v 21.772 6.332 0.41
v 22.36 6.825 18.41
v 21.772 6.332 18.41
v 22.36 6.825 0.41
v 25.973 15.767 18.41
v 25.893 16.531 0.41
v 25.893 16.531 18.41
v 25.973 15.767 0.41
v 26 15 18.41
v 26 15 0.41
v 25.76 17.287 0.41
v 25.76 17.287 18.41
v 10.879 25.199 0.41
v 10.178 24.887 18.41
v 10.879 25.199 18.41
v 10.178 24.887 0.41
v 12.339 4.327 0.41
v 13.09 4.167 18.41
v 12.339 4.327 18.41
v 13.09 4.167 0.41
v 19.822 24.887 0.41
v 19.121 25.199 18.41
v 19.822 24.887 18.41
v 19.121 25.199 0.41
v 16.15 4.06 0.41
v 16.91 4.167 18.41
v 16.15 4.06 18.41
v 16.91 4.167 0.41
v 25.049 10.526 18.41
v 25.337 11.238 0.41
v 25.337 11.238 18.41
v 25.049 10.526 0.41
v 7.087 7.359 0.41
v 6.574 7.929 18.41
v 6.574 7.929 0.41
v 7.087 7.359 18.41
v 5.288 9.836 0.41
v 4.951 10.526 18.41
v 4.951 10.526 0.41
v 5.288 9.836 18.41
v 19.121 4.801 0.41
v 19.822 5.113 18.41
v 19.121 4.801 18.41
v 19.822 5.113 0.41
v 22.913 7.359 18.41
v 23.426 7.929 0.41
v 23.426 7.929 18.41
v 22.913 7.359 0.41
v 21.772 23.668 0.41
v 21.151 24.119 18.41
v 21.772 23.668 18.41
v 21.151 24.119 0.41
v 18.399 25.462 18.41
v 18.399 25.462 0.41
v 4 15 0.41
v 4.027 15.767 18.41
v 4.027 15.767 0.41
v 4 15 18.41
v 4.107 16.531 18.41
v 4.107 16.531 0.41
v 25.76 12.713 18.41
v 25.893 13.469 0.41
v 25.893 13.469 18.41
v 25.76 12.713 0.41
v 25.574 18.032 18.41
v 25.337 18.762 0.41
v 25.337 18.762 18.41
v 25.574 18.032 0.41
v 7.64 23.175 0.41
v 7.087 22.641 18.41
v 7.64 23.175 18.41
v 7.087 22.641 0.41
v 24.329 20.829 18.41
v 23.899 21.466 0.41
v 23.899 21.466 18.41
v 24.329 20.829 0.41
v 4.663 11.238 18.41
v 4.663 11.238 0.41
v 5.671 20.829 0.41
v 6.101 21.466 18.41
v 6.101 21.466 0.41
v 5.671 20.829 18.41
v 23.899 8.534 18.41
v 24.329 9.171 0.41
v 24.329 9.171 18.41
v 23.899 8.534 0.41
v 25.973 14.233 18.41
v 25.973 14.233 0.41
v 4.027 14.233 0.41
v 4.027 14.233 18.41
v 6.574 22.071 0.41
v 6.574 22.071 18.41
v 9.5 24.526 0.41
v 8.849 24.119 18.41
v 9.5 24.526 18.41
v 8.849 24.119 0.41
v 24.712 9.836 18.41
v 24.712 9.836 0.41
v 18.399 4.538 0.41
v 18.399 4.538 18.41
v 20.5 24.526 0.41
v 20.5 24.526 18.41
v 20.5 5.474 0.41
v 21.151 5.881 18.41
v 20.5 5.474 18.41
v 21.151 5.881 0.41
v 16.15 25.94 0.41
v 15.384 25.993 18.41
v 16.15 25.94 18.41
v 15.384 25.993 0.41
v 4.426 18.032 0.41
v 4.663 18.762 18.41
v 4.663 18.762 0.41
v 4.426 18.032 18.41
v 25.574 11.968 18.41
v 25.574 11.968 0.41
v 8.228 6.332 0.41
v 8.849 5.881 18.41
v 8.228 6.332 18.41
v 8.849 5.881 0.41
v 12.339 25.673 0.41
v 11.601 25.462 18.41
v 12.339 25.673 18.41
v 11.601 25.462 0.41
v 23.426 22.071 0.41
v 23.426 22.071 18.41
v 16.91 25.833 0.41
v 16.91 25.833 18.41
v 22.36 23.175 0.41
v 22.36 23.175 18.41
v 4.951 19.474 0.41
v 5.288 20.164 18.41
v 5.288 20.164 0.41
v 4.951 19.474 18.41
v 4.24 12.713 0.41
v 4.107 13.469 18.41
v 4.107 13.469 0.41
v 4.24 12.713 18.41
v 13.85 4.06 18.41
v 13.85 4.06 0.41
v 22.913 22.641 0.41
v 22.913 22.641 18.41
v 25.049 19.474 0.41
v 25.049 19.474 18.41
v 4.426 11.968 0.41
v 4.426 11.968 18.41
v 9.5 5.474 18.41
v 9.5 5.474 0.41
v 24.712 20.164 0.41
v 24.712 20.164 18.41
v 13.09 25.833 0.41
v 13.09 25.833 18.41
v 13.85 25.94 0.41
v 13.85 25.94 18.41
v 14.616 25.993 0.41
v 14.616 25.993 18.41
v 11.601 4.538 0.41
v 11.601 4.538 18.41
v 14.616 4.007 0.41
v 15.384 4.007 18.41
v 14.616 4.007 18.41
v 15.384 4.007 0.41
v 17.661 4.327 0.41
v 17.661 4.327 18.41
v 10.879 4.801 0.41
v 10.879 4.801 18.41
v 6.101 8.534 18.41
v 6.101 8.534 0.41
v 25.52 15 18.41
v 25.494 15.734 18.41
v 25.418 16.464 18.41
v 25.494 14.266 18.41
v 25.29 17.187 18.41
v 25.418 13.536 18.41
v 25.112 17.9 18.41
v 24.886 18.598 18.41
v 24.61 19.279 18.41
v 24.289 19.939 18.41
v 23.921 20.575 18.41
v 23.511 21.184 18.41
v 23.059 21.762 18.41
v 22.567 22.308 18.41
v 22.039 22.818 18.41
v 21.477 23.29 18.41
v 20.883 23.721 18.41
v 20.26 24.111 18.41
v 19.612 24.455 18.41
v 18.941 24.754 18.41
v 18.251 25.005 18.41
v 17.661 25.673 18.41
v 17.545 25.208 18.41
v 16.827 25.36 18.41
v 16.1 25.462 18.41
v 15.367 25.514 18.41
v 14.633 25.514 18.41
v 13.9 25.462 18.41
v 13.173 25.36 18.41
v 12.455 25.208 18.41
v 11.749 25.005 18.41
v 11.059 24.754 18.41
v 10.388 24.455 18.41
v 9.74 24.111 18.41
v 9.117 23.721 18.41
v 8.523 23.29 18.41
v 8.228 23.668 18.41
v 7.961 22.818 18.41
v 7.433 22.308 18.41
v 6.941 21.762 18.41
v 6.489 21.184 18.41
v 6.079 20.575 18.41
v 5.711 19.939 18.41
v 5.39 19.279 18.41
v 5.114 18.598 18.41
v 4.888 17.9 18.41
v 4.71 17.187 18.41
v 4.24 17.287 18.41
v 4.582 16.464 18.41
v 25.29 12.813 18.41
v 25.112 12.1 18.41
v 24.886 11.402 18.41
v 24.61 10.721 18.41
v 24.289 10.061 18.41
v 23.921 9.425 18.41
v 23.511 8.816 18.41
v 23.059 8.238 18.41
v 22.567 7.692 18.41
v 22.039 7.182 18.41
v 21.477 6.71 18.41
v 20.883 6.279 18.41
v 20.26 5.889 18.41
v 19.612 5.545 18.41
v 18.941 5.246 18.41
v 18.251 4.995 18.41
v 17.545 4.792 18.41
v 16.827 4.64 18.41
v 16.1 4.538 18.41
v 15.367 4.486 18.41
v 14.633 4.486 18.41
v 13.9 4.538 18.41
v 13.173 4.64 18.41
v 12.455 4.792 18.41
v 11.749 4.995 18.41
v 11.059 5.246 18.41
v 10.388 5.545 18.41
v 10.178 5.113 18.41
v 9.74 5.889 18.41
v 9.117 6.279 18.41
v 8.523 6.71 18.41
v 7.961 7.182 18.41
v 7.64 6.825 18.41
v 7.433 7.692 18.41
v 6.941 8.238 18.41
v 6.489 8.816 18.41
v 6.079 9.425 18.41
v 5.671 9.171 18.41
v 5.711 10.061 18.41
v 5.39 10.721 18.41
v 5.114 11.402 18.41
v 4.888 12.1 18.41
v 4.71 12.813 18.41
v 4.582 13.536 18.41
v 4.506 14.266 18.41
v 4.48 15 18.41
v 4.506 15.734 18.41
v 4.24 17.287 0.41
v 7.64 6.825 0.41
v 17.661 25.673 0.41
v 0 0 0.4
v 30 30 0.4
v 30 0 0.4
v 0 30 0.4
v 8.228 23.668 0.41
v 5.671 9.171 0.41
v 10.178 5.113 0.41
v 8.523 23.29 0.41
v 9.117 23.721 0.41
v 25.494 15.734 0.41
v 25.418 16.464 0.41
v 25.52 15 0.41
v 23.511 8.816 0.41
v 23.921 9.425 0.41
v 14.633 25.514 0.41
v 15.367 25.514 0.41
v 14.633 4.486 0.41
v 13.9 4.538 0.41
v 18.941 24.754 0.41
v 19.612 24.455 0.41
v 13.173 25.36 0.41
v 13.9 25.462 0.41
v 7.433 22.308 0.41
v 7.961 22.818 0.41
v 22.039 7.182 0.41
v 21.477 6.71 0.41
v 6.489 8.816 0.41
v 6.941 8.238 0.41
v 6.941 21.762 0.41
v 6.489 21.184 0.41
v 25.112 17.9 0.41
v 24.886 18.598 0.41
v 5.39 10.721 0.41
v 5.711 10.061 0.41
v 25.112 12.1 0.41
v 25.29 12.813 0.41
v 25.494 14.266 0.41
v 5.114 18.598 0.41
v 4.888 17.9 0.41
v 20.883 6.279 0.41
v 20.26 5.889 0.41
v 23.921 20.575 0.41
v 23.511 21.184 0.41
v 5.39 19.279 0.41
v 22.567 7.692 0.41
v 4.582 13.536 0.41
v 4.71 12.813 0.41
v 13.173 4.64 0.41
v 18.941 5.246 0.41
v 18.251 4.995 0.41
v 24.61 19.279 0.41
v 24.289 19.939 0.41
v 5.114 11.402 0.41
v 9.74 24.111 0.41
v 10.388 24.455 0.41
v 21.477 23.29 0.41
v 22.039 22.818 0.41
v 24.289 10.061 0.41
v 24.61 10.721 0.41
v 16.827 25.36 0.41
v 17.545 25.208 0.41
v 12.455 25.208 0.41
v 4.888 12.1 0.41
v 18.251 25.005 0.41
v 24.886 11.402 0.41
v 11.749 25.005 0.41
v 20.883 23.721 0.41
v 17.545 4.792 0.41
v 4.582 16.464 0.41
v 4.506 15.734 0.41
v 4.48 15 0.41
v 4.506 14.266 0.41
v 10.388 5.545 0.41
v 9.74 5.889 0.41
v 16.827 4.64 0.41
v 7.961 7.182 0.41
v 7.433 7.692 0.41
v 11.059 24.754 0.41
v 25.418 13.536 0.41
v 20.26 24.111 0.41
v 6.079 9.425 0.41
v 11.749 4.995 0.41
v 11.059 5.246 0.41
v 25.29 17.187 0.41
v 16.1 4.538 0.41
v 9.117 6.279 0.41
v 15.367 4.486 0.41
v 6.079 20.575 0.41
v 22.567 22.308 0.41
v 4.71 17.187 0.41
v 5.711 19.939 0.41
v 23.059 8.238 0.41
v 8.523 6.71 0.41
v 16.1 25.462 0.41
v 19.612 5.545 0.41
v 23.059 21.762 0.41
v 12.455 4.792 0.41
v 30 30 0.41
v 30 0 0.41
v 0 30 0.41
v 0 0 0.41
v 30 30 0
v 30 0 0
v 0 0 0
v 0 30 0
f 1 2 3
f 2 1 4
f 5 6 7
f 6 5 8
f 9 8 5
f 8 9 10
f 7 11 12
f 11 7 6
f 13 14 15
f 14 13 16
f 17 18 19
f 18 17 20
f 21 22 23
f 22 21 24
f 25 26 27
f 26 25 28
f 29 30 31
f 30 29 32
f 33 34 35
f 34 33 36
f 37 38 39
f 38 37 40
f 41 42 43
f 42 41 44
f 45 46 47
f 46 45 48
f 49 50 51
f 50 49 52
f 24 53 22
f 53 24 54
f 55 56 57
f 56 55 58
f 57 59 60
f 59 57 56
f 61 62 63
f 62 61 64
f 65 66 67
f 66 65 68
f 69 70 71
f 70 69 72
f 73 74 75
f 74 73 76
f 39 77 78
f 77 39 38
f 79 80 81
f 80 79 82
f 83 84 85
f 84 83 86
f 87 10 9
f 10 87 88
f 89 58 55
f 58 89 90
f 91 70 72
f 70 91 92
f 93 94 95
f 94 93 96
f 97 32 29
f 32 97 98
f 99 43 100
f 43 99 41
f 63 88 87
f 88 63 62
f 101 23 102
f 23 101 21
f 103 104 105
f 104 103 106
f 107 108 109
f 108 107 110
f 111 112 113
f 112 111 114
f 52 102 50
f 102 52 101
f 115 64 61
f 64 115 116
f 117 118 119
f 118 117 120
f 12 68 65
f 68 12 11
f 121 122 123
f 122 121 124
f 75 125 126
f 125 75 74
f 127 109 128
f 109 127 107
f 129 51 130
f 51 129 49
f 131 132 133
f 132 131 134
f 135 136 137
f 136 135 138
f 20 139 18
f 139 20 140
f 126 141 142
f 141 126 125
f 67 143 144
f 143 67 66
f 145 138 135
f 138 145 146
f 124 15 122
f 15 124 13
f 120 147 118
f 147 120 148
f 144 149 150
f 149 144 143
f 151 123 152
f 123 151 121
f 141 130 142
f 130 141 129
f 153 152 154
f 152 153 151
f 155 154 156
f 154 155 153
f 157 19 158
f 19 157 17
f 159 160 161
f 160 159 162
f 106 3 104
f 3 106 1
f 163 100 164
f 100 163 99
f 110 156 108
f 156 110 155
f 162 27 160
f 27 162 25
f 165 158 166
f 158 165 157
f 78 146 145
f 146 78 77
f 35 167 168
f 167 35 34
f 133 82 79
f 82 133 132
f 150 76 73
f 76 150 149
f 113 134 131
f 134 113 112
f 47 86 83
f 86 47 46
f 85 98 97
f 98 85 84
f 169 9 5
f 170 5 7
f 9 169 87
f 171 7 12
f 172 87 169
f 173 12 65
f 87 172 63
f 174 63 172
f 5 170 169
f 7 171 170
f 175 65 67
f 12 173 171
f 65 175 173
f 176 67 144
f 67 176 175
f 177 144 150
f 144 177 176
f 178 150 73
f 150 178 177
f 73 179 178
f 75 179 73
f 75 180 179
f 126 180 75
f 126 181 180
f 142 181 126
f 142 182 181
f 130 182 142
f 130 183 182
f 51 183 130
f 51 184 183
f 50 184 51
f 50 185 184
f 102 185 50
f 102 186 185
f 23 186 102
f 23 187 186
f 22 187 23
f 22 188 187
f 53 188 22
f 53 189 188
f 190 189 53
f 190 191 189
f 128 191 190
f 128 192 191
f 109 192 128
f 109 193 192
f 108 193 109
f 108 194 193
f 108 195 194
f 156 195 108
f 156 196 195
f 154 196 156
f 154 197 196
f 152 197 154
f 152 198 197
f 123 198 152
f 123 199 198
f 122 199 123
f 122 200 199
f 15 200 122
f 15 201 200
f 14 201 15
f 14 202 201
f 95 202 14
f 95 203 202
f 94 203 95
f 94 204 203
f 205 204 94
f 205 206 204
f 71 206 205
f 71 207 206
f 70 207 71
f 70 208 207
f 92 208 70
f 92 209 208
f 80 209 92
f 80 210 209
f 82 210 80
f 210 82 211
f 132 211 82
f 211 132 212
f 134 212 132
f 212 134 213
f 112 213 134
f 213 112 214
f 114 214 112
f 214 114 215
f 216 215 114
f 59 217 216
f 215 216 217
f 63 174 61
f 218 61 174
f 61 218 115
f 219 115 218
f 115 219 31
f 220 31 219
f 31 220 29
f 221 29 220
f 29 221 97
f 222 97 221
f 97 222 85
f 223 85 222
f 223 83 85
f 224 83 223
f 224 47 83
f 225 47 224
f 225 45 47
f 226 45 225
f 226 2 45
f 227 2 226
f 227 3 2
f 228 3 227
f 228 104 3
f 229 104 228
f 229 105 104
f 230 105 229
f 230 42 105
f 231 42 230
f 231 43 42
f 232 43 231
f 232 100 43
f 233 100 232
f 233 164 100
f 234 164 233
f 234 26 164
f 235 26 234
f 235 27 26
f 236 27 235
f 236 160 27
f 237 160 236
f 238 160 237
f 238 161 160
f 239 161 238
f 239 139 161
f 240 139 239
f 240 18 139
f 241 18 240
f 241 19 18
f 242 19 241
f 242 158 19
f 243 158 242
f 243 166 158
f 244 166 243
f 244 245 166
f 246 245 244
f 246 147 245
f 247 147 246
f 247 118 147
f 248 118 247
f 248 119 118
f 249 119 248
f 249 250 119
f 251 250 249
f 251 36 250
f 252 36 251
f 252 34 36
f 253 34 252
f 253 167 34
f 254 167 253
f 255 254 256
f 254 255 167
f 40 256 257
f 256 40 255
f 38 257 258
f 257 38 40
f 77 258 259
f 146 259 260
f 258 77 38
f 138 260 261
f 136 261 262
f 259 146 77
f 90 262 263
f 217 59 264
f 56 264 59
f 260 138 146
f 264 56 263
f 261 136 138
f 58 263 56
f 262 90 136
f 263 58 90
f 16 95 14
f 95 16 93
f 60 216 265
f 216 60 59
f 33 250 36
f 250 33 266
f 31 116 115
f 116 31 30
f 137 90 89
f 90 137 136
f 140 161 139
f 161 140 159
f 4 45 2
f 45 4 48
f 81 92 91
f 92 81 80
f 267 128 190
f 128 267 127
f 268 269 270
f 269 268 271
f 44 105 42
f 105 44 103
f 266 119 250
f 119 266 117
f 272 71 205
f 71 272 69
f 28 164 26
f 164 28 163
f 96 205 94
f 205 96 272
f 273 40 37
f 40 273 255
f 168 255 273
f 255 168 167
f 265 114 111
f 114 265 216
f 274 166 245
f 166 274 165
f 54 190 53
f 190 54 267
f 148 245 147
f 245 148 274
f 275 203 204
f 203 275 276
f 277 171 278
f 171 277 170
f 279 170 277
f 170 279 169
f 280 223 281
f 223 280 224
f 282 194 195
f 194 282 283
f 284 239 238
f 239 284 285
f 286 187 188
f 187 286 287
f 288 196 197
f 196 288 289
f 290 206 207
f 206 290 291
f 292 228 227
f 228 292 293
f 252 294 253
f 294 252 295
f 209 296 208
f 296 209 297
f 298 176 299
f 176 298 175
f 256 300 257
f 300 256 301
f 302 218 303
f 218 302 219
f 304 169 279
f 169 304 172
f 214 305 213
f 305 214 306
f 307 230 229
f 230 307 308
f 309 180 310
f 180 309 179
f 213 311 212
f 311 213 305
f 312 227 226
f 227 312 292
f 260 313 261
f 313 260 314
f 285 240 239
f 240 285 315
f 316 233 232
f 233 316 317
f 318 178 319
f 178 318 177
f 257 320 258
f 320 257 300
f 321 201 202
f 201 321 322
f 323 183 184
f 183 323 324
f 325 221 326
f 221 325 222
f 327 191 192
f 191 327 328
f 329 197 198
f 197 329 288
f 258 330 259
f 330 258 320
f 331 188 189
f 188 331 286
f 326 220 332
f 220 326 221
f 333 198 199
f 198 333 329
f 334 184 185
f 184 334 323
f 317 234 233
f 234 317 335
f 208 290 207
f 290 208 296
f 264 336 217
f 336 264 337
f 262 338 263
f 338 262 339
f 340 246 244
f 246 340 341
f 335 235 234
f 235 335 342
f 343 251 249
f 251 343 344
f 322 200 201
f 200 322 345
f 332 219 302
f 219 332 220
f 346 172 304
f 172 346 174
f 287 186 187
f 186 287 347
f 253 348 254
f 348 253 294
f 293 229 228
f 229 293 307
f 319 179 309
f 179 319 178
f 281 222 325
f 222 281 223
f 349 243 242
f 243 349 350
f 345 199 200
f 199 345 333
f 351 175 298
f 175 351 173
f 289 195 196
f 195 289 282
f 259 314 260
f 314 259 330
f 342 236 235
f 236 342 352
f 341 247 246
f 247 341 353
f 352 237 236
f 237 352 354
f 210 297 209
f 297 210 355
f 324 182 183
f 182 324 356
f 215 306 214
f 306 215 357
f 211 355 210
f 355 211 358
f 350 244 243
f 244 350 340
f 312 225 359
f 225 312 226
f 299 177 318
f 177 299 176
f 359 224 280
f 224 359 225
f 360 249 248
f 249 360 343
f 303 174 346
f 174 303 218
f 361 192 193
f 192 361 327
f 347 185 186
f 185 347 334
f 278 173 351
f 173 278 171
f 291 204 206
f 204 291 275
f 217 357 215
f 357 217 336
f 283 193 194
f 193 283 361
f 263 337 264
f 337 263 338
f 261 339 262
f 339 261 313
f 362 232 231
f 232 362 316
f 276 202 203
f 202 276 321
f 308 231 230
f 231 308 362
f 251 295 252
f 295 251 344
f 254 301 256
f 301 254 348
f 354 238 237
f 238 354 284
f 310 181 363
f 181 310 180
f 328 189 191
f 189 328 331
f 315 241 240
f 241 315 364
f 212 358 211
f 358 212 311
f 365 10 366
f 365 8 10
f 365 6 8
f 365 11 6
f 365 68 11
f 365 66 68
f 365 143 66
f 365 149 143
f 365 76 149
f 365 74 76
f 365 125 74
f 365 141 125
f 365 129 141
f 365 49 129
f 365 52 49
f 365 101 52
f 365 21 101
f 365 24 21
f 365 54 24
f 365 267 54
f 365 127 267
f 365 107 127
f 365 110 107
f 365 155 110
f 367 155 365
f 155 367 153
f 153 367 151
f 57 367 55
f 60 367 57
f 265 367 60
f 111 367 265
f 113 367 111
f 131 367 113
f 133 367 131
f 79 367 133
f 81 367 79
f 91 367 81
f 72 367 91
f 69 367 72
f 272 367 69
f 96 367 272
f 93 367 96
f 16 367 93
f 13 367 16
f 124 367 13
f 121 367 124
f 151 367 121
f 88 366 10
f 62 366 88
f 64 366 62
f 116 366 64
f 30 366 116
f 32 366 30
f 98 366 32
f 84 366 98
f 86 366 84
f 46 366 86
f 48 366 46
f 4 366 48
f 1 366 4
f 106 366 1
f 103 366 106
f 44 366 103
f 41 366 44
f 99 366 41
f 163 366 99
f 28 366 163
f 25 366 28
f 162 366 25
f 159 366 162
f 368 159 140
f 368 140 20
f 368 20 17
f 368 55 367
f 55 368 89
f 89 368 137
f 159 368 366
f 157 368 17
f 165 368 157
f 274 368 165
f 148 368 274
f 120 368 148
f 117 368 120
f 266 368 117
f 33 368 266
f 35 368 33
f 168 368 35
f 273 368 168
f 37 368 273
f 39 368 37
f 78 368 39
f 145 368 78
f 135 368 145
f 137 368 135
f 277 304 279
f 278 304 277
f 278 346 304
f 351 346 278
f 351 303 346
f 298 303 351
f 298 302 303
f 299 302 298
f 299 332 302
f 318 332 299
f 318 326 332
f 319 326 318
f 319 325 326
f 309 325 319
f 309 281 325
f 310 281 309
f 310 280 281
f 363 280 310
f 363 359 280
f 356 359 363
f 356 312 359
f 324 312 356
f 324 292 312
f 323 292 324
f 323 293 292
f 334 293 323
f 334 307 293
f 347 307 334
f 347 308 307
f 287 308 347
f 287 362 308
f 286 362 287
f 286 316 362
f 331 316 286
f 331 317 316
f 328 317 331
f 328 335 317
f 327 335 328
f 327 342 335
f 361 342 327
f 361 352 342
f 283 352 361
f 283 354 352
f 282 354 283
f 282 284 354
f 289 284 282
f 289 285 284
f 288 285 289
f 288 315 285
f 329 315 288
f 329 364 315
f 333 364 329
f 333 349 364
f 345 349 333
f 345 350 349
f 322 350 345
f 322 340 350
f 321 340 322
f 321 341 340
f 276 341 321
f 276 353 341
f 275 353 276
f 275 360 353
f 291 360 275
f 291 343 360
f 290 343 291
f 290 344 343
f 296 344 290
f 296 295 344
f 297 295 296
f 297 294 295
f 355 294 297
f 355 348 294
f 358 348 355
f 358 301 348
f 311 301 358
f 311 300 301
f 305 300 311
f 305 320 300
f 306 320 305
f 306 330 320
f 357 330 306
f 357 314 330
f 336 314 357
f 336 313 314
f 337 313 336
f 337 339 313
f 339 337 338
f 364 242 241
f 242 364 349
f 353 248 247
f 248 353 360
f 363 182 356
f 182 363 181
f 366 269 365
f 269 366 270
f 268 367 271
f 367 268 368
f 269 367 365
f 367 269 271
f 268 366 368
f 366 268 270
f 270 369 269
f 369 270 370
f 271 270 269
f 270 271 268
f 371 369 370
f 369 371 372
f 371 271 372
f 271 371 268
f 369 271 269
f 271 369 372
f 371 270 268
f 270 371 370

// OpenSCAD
// file: ../../Base/PlacementOptions.scad
// Fischertechnik Box Foundation
// Placement Options

// Alignment
NoAlign = 0;
AlignLeft = 1;
AlignBottom = 2;
AlignCenter = 3;
AlignRight = 4;
AlignTop = 5;

// Element rotation degree steps
rotations = [0, -90, -180, -270];

// Rotation
NoRotation = 0;
Rotate0 = 0;
Rotate90 = 1;
Rotate180 = 2;
Rotate270 = 3;

// Docking (seen from above)
NoDock = -1;
DockLeft = 0;
DockTop = 1;
DockRight = 2;
DockCorner = 2;
DockBottom = 3;

// Web corners
LowerLeft = 0;
UpperLeft = 1;
UpperRight = 2;
LowerRight = 3;

// Web position relative to corner
LeftOfCorner = 0;
RightOfCorner = 1;
// file: ../../Base/Boxes.scad
// Fischertechnik Box Foundation
// Pre-designed Boxes

use <Constants.scad>

include <PlacementOptions.scad>

box190Width = 190;
box190Depth = 130;
box130Width = 130;
box130Depth = 95;
boxUsageHeight = 33.9;
boxWallThickness = 2.4;
boxBaseThickness = 1.0;
boxWebWidth = 3.0;

// getBoxWallThickness()
// Gets the wall thickness of a Fischertechnik Box

function getBoxWallThickness() = boxWallThickness;

// Gets the usable height of a fischertechnik box
function getBoxUsageHeight() = boxUsageHeight;

// Gets the thickness of the Fischertechnik box base.
function getBoxBaseThickness() = boxBaseThickness;

// Gets the width of a box web
function getBoxWebWidth() = boxWebWidth;

// Gets the usable inner space of a Box 190 as an x/y-list
function getBox190Space() = [
    box190Width - 2*getBoxWallThickness(), 
    box190Depth - 2*getBoxWallThickness() ];

// Imports the Fischertechnik empty box 130x190 mm and places it at position 0,0
// 190x130 are the outer sizes, the inner space is slightly smaller. Use getBox190Space() to get the inner sizes.
// This module needs the STL file "Fischertechnik Box 130x190.stl" in the library path.
// The box is positioned that the usable inner space is at the 0,0,0 position. The

module Box190() {
    translate([-getBoxWallThickness(),-getBoxWallThickness(),-getBoxBaseThickness()])
        import("Fischertechnik Box 130x190.stl", convexity=3);
}

// Gets the usable inner space of a Box 130 as an x/y-list
function getBox130Space() = [
    box130Width - 2*getBoxWallThickness(), 
    box130Depth - 2*getBoxWallThickness() ];

// Imports the Fischertechnik empty box 95x130 mm and places it at position 0,0
// 190x130 are the outer sizes, the inner space is slightly smaller. Use getBox190Space() to get the inner sizes.
// This module needs the STL file "Fischertechnik Box 95x130.stl" in the library path.
// The box is positioned that the usable inner space is at the 0,0,0 position. The

module Box130() {
    translate([-getBoxWallThickness(),-getBoxWallThickness(),-getBoxBaseThickness()])
        import("Fischertechnik Box 95x130.stl", convexity=3);
}

// Creates a web at the specified box walls
// corner 0 = LowerLeft, 1 = UpperLeft, 2 = UpperRight, 3 = LowerRight
// side 0 = LeftOfCorner, 1 = RightOfCorner
// distance = Distance in mm from the corner
// box = inner width and depth of the box (default: Box 190)
// webWidth = length of the web (default is 3 mms)
// webThickness = thickness of the web (default is 1 mm)

module BoxWeb(corner, side, distance, box=getBox190Space(), webWidth=getBoxWebWidth(), webThickness=1.0) {
    sink = getBoxWallThickness()/2;

    width = (corner % 2 == 0) ? 
            (side == LeftOfCorner ? webWidth : webThickness) :
            (side == LeftOfCorner ? webThickness : webWidth);

    depth = (corner % 2 == 0) ? 
            (side == RightOfCorner ? webWidth : webThickness) :
            (side == RightOfCorner ? webThickness : webWidth);
    
    xDiff = corner == LowerLeft ? 
                (side == LeftOfCorner ? -sink : distance) :
            (corner == UpperLeft ?                
                (side == LeftOfCorner ? distance : -sink) :
            (corner == UpperRight ?
                (side == LeftOfCorner ? box.x-webWidth+sink : box.x-distance-webThickness) :
                (side == LeftOfCorner ? box.x-distance-webThickness: box.x-webWidth+sink)));

    yDiff = corner == LowerLeft ? 
                (side == RightOfCorner ? -sink : distance) :
            (corner == UpperLeft ?
                (side == RightOfCorner ? box.y-distance : box.y-webWidth+sink) :
            (corner == UpperRight ?
                (side == RightOfCorner ? box.y-webWidth+sink : box.y-distance) :
                (side == RightOfCorner ? distance : -sink)));
    
    translate([xDiff, yDiff, -getExcess()])
        cube([width, depth, boxUsageHeight + 2*getExcess()]);
}
// file: ../../Base/Rotation.scad
// Fischertechnik Box Foundation
// Geometry Helpers Rotation

include <PlacementOptions.scad>

// getRotatedSpace(space, rotation=NoRotation)
// Rotates the space dependent on the specified rotation

function getRotatedSpace(space, rotation=NoRotation) = [
    (rotation == Rotate90 || rotation == Rotate270) ? space.y : space.x,
    (rotation == Rotate90 || rotation == Rotate270) ? space.x : space.y
];

// Rotates the given space around the fixed left lower corner
// space = the space the children needs as width/depth list [width,depth]
// rotation = 0 Rotate0 degrees, 1 Rotate90 degrees, 2 Rotate180 degrees, 3 Rotate270 degrees (equivalent to -90)

module RotateFix(space, rotation=Rotate0) {
    dy = (rotation == Rotate0 || rotation == Rotate270) ? 0 :
        (rotation == Rotate90) ? space.x :
        space.y;
    dx = (rotation < Rotate180) ? 0 :
        (rotation == Rotate180) ? space.x :
        space.y;
    
    translate([dx, dy, 0])
        rotate([0, 0, rotations[rotation]])
            children();
}
// file: ../../Base/Alignment.scad
// Fischertechnik Box Foundation
// Geometry Helpers Alignment

include <PlacementOptions.scad>

// getAlignedX(elementWidth, spaceWidth, align=AlignRight, offset=0)
// Gets the aligned X offset of an element with the given
// width in the given space.
// elementWidth = The width of the element to positon
// spaceWidth = The space where the element should be aligned
// align = 0 AlignLeft, 1 AlignCenter, 2 AlignRight
// offset = an optional offset from the aligned position. When
// aligned left or centered, then positive values are in X direction.
// When aligned right then positive values are in negative X direction.

function getAlignedX(elementWidth, spaceWidth, align=AlignRight, offset=0) =
    (align == AlignLeft) ?
        offset :
        ((align == AlignCenter) ?
        (spaceWidth - elementWidth)/2 + offset :
        spaceWidth - offset - elementWidth);

// getAlignedY(elementDepth, spaceDepth, align=AlignTop, offset=0)
// Gets the aligned Y offset of an element with the given
// depth in the given space.
// elementDepth = The depth of the element to positon
// spaceDepth = The space where the element should be aligned
// align = 0 AlignBottom, 1 AlignCenter, 2 AlignTop
// offset = an optional offset from the aligned position. When
// aligned bottom or centered, then positive values are in Y direction.
// When aligned top then positive values are in negative Y direction.

function getAlignedY(elementDepth, spaceDepth, align=AlignTop, offset=0) =
    (align == AlignBottom) ?
        offset :
        ((align == AlignCenter) ?
        (spaceDepth - elementDepth)/2 + offset :
        spaceDepth - offset - elementDepth);
// file: ../../Base/Placement.scad
// Fischertechnik Box Foundation
// Geometry Helpers Placement

use <Constants.scad>
use <Alignment.scad>
use <Rotation.scad>
use <Boxes.scad>

include <PlacementOptions.scad>

// Place(x=0, y=0, elementSpace=[0,0], alignX=AlignLeft, alignY=AlignBottom, rotation=Rotate0, boxSpace=getBox190Space())
// Places the child at the specified position
// y = Y-Position. This is a relative position when an X aligment is specified.
// x = X-Position. This is a relative position when an Y aligment is specified.
// elementSpace = space of the element to be placed [x,y]
// alignX = -1=NoAlign, 0 AlignLeft, 1 AlignCenter, 3 AlignRight (elementSpace and boxSpace required!)
// alignY = -1=NoAlign, 2 AlignBottom, 1 AlignCenter, 4 AlignTop (elementSpace and boxSpace required!)
// rotation = 0 Rotate0 0 degrees, 1 Rotate90 90 degrees, 
// 2 Rotate180 180 degrees, 3 Rotate270 270 degrees (equivalent to -90)
// boxSpace = Inner space of the box where the placement occurs [x,y] - default is Box 190x130 inner space

module Place(x=0, y=0, elementSpace=[0,0], 
  alignX=AlignLeft, alignY=AlignBottom, 
  rotation=NoRotation, boxSpace=getBox190Space()) {

    module Position(x, y, space, rotation=Rotate0) {
        translate([x, y, 0])
            RotateFix(space, rotation)
                children();
    }

    space = getRotatedSpace(elementSpace, rotation);
    alignedX = getAlignedX(space.x, boxSpace.x, alignX, x);
    alignedY = getAlignedY(space.y, boxSpace.y, alignY, y);
    Position(alignedX, alignedY, elementSpace, rotation)
        children();
}

// Center(space=getBox130Space(), elementSpace=[0,0])
// space = Space where the children is centered. For cylinder use centered=true and no elementSpace.
// elementSpace = space of the element to be centered [x,y]

module Center(space=getBox190Space(), elementSpace=[0,0]) {
    translate([(space.x - elementSpace.x) / 2, (space.y - elementSpace.y) / 2])
        children(0);
}

// CenterHorizontal(width=0, y=0, offset=0, space=getBox130Space())
// space = Space where the children is centered. For cylinder use centered=true and no elementSpace.
// elementSpace = space of the element to be centered [x,y]

module CenterHorizontal(width=0, y=0, offset=0, space=getBox190Space()) {
    translate([(space.x - width) / 2 + offset, y])
        children(0);
}

// CenterVertical(depth=0, x=0, offset=0, space=getBox130Space())
// space = Space where the children is centered. For cylinder use centered=true and no elementSpace.
// elementSpace = space of the element to be centered [x,y]

module CenterVertical(depth=0, x=0, offset=0, space=getBox190Space()) {
    translate([x, (space.y - depth) / 2 + offset])
        children(0);
}
// file: ../../Elements/AxisClip10.scad
// Fischertechnik Box Library
// Axis for clip 10
// 31023

use <../ModelBase/Simple.scad>

width = 12;
depth = 12;
height = 23;

// getAxisClip10Space()
// Gets the space of a frame for a clip 10 with spring ring (mot2)

function getAxisClip10Space() = [width, depth, height];

// AxisClip10()
// Axis for clip 10 with spring ring (mot2)

module AxisClip10() {
    LeveledAxisWithSpace(height, height-10, getAxisClip10Space());
}

// Tests
color("lightgray")
AxisClip10();
// file: ../../Base/Constants.scad
// Fischertechnik Box Foundation
// Constants

// Constant values necessary for multiple elements

// Base constants
dividerThickness = 1.2;
excess = 0.01;
fragments = 90;
tolerance = 0.8;

// Gets the thickness of a divider 
function getDividerThickness() = dividerThickness;

// Gets the excess that is used to merge walls into each other
function getExcess() = excess;

// Gets amount of fragments of a cylinder
function getFragments() = fragments;

// Gets the inner tolerance of a frame to each side
function getTolerance() = tolerance;


// Fischertechnik specific constants
axisDiameter = 4;
axisBottomDiameter = axisDiameter + 1;
standardEdgeDistance = 2.5;
standardWebDistance = 11.5;
standardCornerLength = 15;
tubeWallFactor = 0.8;

// Gets axis diameter
function getAxisDiameter() = axisDiameter;

// Gets axis bottom diameter for thicker part at the bottom
function getAxisBottomDiameter() = axisBottomDiameter;

// gets the standard distance to the wall of the box for dockable frames with webs
function getStandardEdgeDistance() = standardEdgeDistance;

// gets the standard distance of each web to the corner of the dockable frame
function getStandardWebDistance() = standardWebDistance;

// gets the standard length of the corner walls of a dockable frame
function getStandardCornerLength() = standardCornerLength;

// gets the wall thickness of a tube.
function getTubeWallThickness() = tubeWallFactor * getDividerThickness();
// file: ../../Elements/CylinderTire20.scad
// Fischertechnik Box Library
// Cylinder for Tires 
// 31017

use <../Base/Constants.scad>
use <../Base/Placement.scad>
use <../ModelBase/Simple.scad>

width = 30;
depth = 30;

// getCylinderTire20Space()
// Gets the space the cylinder tite 20 as width and depth (.x and .y as a list)

function getCylinderTire20Space() = [width, depth];

// CylinderTire30()
// Standing cylinder for tire 30 (newer version).
// If count is less than 3 then a thicker cylinder base is 
// generated to elevate the tires.
// count = count of stapled tires (1 to 4)
// 31017

module CylinderTire20(count=3) {
    innerDiameter = 22;
    outerDiameter = 24.8;
    tireWidth = 6;

    minimumInnerHeight = 3 * tireWidth;
    neededHeight = count * tireWidth;
    actualHeight = max(neededHeight, minimumInnerHeight);
    
    innerHeight = actualHeight;
    outerHeight =  actualHeight - neededHeight;

    Space(getCylinderTire20Space());
    
    Center(getCylinderTire20Space())
        LeveledTube(innerHeight, innerDiameter, outerHeight, outerDiameter);
}

// Tests
color("lightgray")
CylinderTire20(2);
// file: ../TestPrint.scad
// 3D Print Test Base

use <../Base/Constants.scad>

use <../Elements/AxisClip10.scad>

module TestPrint(elementSpace) {
    cube([elementSpace.x, elementSpace.y, 0.4]);
    translate([0,0,0.4+getExcess()]) {
        children();
    }
}

TestPrint(getAxisClip10Space())
    AxisClip10();
// main file
// 3D Print Test Base
// CylinderTire20

use <../TestPrint.scad>
use <../../Elements/CylinderTire20.scad>

TestPrint(getCylinderTire20Space())
    CylinderTire20();
